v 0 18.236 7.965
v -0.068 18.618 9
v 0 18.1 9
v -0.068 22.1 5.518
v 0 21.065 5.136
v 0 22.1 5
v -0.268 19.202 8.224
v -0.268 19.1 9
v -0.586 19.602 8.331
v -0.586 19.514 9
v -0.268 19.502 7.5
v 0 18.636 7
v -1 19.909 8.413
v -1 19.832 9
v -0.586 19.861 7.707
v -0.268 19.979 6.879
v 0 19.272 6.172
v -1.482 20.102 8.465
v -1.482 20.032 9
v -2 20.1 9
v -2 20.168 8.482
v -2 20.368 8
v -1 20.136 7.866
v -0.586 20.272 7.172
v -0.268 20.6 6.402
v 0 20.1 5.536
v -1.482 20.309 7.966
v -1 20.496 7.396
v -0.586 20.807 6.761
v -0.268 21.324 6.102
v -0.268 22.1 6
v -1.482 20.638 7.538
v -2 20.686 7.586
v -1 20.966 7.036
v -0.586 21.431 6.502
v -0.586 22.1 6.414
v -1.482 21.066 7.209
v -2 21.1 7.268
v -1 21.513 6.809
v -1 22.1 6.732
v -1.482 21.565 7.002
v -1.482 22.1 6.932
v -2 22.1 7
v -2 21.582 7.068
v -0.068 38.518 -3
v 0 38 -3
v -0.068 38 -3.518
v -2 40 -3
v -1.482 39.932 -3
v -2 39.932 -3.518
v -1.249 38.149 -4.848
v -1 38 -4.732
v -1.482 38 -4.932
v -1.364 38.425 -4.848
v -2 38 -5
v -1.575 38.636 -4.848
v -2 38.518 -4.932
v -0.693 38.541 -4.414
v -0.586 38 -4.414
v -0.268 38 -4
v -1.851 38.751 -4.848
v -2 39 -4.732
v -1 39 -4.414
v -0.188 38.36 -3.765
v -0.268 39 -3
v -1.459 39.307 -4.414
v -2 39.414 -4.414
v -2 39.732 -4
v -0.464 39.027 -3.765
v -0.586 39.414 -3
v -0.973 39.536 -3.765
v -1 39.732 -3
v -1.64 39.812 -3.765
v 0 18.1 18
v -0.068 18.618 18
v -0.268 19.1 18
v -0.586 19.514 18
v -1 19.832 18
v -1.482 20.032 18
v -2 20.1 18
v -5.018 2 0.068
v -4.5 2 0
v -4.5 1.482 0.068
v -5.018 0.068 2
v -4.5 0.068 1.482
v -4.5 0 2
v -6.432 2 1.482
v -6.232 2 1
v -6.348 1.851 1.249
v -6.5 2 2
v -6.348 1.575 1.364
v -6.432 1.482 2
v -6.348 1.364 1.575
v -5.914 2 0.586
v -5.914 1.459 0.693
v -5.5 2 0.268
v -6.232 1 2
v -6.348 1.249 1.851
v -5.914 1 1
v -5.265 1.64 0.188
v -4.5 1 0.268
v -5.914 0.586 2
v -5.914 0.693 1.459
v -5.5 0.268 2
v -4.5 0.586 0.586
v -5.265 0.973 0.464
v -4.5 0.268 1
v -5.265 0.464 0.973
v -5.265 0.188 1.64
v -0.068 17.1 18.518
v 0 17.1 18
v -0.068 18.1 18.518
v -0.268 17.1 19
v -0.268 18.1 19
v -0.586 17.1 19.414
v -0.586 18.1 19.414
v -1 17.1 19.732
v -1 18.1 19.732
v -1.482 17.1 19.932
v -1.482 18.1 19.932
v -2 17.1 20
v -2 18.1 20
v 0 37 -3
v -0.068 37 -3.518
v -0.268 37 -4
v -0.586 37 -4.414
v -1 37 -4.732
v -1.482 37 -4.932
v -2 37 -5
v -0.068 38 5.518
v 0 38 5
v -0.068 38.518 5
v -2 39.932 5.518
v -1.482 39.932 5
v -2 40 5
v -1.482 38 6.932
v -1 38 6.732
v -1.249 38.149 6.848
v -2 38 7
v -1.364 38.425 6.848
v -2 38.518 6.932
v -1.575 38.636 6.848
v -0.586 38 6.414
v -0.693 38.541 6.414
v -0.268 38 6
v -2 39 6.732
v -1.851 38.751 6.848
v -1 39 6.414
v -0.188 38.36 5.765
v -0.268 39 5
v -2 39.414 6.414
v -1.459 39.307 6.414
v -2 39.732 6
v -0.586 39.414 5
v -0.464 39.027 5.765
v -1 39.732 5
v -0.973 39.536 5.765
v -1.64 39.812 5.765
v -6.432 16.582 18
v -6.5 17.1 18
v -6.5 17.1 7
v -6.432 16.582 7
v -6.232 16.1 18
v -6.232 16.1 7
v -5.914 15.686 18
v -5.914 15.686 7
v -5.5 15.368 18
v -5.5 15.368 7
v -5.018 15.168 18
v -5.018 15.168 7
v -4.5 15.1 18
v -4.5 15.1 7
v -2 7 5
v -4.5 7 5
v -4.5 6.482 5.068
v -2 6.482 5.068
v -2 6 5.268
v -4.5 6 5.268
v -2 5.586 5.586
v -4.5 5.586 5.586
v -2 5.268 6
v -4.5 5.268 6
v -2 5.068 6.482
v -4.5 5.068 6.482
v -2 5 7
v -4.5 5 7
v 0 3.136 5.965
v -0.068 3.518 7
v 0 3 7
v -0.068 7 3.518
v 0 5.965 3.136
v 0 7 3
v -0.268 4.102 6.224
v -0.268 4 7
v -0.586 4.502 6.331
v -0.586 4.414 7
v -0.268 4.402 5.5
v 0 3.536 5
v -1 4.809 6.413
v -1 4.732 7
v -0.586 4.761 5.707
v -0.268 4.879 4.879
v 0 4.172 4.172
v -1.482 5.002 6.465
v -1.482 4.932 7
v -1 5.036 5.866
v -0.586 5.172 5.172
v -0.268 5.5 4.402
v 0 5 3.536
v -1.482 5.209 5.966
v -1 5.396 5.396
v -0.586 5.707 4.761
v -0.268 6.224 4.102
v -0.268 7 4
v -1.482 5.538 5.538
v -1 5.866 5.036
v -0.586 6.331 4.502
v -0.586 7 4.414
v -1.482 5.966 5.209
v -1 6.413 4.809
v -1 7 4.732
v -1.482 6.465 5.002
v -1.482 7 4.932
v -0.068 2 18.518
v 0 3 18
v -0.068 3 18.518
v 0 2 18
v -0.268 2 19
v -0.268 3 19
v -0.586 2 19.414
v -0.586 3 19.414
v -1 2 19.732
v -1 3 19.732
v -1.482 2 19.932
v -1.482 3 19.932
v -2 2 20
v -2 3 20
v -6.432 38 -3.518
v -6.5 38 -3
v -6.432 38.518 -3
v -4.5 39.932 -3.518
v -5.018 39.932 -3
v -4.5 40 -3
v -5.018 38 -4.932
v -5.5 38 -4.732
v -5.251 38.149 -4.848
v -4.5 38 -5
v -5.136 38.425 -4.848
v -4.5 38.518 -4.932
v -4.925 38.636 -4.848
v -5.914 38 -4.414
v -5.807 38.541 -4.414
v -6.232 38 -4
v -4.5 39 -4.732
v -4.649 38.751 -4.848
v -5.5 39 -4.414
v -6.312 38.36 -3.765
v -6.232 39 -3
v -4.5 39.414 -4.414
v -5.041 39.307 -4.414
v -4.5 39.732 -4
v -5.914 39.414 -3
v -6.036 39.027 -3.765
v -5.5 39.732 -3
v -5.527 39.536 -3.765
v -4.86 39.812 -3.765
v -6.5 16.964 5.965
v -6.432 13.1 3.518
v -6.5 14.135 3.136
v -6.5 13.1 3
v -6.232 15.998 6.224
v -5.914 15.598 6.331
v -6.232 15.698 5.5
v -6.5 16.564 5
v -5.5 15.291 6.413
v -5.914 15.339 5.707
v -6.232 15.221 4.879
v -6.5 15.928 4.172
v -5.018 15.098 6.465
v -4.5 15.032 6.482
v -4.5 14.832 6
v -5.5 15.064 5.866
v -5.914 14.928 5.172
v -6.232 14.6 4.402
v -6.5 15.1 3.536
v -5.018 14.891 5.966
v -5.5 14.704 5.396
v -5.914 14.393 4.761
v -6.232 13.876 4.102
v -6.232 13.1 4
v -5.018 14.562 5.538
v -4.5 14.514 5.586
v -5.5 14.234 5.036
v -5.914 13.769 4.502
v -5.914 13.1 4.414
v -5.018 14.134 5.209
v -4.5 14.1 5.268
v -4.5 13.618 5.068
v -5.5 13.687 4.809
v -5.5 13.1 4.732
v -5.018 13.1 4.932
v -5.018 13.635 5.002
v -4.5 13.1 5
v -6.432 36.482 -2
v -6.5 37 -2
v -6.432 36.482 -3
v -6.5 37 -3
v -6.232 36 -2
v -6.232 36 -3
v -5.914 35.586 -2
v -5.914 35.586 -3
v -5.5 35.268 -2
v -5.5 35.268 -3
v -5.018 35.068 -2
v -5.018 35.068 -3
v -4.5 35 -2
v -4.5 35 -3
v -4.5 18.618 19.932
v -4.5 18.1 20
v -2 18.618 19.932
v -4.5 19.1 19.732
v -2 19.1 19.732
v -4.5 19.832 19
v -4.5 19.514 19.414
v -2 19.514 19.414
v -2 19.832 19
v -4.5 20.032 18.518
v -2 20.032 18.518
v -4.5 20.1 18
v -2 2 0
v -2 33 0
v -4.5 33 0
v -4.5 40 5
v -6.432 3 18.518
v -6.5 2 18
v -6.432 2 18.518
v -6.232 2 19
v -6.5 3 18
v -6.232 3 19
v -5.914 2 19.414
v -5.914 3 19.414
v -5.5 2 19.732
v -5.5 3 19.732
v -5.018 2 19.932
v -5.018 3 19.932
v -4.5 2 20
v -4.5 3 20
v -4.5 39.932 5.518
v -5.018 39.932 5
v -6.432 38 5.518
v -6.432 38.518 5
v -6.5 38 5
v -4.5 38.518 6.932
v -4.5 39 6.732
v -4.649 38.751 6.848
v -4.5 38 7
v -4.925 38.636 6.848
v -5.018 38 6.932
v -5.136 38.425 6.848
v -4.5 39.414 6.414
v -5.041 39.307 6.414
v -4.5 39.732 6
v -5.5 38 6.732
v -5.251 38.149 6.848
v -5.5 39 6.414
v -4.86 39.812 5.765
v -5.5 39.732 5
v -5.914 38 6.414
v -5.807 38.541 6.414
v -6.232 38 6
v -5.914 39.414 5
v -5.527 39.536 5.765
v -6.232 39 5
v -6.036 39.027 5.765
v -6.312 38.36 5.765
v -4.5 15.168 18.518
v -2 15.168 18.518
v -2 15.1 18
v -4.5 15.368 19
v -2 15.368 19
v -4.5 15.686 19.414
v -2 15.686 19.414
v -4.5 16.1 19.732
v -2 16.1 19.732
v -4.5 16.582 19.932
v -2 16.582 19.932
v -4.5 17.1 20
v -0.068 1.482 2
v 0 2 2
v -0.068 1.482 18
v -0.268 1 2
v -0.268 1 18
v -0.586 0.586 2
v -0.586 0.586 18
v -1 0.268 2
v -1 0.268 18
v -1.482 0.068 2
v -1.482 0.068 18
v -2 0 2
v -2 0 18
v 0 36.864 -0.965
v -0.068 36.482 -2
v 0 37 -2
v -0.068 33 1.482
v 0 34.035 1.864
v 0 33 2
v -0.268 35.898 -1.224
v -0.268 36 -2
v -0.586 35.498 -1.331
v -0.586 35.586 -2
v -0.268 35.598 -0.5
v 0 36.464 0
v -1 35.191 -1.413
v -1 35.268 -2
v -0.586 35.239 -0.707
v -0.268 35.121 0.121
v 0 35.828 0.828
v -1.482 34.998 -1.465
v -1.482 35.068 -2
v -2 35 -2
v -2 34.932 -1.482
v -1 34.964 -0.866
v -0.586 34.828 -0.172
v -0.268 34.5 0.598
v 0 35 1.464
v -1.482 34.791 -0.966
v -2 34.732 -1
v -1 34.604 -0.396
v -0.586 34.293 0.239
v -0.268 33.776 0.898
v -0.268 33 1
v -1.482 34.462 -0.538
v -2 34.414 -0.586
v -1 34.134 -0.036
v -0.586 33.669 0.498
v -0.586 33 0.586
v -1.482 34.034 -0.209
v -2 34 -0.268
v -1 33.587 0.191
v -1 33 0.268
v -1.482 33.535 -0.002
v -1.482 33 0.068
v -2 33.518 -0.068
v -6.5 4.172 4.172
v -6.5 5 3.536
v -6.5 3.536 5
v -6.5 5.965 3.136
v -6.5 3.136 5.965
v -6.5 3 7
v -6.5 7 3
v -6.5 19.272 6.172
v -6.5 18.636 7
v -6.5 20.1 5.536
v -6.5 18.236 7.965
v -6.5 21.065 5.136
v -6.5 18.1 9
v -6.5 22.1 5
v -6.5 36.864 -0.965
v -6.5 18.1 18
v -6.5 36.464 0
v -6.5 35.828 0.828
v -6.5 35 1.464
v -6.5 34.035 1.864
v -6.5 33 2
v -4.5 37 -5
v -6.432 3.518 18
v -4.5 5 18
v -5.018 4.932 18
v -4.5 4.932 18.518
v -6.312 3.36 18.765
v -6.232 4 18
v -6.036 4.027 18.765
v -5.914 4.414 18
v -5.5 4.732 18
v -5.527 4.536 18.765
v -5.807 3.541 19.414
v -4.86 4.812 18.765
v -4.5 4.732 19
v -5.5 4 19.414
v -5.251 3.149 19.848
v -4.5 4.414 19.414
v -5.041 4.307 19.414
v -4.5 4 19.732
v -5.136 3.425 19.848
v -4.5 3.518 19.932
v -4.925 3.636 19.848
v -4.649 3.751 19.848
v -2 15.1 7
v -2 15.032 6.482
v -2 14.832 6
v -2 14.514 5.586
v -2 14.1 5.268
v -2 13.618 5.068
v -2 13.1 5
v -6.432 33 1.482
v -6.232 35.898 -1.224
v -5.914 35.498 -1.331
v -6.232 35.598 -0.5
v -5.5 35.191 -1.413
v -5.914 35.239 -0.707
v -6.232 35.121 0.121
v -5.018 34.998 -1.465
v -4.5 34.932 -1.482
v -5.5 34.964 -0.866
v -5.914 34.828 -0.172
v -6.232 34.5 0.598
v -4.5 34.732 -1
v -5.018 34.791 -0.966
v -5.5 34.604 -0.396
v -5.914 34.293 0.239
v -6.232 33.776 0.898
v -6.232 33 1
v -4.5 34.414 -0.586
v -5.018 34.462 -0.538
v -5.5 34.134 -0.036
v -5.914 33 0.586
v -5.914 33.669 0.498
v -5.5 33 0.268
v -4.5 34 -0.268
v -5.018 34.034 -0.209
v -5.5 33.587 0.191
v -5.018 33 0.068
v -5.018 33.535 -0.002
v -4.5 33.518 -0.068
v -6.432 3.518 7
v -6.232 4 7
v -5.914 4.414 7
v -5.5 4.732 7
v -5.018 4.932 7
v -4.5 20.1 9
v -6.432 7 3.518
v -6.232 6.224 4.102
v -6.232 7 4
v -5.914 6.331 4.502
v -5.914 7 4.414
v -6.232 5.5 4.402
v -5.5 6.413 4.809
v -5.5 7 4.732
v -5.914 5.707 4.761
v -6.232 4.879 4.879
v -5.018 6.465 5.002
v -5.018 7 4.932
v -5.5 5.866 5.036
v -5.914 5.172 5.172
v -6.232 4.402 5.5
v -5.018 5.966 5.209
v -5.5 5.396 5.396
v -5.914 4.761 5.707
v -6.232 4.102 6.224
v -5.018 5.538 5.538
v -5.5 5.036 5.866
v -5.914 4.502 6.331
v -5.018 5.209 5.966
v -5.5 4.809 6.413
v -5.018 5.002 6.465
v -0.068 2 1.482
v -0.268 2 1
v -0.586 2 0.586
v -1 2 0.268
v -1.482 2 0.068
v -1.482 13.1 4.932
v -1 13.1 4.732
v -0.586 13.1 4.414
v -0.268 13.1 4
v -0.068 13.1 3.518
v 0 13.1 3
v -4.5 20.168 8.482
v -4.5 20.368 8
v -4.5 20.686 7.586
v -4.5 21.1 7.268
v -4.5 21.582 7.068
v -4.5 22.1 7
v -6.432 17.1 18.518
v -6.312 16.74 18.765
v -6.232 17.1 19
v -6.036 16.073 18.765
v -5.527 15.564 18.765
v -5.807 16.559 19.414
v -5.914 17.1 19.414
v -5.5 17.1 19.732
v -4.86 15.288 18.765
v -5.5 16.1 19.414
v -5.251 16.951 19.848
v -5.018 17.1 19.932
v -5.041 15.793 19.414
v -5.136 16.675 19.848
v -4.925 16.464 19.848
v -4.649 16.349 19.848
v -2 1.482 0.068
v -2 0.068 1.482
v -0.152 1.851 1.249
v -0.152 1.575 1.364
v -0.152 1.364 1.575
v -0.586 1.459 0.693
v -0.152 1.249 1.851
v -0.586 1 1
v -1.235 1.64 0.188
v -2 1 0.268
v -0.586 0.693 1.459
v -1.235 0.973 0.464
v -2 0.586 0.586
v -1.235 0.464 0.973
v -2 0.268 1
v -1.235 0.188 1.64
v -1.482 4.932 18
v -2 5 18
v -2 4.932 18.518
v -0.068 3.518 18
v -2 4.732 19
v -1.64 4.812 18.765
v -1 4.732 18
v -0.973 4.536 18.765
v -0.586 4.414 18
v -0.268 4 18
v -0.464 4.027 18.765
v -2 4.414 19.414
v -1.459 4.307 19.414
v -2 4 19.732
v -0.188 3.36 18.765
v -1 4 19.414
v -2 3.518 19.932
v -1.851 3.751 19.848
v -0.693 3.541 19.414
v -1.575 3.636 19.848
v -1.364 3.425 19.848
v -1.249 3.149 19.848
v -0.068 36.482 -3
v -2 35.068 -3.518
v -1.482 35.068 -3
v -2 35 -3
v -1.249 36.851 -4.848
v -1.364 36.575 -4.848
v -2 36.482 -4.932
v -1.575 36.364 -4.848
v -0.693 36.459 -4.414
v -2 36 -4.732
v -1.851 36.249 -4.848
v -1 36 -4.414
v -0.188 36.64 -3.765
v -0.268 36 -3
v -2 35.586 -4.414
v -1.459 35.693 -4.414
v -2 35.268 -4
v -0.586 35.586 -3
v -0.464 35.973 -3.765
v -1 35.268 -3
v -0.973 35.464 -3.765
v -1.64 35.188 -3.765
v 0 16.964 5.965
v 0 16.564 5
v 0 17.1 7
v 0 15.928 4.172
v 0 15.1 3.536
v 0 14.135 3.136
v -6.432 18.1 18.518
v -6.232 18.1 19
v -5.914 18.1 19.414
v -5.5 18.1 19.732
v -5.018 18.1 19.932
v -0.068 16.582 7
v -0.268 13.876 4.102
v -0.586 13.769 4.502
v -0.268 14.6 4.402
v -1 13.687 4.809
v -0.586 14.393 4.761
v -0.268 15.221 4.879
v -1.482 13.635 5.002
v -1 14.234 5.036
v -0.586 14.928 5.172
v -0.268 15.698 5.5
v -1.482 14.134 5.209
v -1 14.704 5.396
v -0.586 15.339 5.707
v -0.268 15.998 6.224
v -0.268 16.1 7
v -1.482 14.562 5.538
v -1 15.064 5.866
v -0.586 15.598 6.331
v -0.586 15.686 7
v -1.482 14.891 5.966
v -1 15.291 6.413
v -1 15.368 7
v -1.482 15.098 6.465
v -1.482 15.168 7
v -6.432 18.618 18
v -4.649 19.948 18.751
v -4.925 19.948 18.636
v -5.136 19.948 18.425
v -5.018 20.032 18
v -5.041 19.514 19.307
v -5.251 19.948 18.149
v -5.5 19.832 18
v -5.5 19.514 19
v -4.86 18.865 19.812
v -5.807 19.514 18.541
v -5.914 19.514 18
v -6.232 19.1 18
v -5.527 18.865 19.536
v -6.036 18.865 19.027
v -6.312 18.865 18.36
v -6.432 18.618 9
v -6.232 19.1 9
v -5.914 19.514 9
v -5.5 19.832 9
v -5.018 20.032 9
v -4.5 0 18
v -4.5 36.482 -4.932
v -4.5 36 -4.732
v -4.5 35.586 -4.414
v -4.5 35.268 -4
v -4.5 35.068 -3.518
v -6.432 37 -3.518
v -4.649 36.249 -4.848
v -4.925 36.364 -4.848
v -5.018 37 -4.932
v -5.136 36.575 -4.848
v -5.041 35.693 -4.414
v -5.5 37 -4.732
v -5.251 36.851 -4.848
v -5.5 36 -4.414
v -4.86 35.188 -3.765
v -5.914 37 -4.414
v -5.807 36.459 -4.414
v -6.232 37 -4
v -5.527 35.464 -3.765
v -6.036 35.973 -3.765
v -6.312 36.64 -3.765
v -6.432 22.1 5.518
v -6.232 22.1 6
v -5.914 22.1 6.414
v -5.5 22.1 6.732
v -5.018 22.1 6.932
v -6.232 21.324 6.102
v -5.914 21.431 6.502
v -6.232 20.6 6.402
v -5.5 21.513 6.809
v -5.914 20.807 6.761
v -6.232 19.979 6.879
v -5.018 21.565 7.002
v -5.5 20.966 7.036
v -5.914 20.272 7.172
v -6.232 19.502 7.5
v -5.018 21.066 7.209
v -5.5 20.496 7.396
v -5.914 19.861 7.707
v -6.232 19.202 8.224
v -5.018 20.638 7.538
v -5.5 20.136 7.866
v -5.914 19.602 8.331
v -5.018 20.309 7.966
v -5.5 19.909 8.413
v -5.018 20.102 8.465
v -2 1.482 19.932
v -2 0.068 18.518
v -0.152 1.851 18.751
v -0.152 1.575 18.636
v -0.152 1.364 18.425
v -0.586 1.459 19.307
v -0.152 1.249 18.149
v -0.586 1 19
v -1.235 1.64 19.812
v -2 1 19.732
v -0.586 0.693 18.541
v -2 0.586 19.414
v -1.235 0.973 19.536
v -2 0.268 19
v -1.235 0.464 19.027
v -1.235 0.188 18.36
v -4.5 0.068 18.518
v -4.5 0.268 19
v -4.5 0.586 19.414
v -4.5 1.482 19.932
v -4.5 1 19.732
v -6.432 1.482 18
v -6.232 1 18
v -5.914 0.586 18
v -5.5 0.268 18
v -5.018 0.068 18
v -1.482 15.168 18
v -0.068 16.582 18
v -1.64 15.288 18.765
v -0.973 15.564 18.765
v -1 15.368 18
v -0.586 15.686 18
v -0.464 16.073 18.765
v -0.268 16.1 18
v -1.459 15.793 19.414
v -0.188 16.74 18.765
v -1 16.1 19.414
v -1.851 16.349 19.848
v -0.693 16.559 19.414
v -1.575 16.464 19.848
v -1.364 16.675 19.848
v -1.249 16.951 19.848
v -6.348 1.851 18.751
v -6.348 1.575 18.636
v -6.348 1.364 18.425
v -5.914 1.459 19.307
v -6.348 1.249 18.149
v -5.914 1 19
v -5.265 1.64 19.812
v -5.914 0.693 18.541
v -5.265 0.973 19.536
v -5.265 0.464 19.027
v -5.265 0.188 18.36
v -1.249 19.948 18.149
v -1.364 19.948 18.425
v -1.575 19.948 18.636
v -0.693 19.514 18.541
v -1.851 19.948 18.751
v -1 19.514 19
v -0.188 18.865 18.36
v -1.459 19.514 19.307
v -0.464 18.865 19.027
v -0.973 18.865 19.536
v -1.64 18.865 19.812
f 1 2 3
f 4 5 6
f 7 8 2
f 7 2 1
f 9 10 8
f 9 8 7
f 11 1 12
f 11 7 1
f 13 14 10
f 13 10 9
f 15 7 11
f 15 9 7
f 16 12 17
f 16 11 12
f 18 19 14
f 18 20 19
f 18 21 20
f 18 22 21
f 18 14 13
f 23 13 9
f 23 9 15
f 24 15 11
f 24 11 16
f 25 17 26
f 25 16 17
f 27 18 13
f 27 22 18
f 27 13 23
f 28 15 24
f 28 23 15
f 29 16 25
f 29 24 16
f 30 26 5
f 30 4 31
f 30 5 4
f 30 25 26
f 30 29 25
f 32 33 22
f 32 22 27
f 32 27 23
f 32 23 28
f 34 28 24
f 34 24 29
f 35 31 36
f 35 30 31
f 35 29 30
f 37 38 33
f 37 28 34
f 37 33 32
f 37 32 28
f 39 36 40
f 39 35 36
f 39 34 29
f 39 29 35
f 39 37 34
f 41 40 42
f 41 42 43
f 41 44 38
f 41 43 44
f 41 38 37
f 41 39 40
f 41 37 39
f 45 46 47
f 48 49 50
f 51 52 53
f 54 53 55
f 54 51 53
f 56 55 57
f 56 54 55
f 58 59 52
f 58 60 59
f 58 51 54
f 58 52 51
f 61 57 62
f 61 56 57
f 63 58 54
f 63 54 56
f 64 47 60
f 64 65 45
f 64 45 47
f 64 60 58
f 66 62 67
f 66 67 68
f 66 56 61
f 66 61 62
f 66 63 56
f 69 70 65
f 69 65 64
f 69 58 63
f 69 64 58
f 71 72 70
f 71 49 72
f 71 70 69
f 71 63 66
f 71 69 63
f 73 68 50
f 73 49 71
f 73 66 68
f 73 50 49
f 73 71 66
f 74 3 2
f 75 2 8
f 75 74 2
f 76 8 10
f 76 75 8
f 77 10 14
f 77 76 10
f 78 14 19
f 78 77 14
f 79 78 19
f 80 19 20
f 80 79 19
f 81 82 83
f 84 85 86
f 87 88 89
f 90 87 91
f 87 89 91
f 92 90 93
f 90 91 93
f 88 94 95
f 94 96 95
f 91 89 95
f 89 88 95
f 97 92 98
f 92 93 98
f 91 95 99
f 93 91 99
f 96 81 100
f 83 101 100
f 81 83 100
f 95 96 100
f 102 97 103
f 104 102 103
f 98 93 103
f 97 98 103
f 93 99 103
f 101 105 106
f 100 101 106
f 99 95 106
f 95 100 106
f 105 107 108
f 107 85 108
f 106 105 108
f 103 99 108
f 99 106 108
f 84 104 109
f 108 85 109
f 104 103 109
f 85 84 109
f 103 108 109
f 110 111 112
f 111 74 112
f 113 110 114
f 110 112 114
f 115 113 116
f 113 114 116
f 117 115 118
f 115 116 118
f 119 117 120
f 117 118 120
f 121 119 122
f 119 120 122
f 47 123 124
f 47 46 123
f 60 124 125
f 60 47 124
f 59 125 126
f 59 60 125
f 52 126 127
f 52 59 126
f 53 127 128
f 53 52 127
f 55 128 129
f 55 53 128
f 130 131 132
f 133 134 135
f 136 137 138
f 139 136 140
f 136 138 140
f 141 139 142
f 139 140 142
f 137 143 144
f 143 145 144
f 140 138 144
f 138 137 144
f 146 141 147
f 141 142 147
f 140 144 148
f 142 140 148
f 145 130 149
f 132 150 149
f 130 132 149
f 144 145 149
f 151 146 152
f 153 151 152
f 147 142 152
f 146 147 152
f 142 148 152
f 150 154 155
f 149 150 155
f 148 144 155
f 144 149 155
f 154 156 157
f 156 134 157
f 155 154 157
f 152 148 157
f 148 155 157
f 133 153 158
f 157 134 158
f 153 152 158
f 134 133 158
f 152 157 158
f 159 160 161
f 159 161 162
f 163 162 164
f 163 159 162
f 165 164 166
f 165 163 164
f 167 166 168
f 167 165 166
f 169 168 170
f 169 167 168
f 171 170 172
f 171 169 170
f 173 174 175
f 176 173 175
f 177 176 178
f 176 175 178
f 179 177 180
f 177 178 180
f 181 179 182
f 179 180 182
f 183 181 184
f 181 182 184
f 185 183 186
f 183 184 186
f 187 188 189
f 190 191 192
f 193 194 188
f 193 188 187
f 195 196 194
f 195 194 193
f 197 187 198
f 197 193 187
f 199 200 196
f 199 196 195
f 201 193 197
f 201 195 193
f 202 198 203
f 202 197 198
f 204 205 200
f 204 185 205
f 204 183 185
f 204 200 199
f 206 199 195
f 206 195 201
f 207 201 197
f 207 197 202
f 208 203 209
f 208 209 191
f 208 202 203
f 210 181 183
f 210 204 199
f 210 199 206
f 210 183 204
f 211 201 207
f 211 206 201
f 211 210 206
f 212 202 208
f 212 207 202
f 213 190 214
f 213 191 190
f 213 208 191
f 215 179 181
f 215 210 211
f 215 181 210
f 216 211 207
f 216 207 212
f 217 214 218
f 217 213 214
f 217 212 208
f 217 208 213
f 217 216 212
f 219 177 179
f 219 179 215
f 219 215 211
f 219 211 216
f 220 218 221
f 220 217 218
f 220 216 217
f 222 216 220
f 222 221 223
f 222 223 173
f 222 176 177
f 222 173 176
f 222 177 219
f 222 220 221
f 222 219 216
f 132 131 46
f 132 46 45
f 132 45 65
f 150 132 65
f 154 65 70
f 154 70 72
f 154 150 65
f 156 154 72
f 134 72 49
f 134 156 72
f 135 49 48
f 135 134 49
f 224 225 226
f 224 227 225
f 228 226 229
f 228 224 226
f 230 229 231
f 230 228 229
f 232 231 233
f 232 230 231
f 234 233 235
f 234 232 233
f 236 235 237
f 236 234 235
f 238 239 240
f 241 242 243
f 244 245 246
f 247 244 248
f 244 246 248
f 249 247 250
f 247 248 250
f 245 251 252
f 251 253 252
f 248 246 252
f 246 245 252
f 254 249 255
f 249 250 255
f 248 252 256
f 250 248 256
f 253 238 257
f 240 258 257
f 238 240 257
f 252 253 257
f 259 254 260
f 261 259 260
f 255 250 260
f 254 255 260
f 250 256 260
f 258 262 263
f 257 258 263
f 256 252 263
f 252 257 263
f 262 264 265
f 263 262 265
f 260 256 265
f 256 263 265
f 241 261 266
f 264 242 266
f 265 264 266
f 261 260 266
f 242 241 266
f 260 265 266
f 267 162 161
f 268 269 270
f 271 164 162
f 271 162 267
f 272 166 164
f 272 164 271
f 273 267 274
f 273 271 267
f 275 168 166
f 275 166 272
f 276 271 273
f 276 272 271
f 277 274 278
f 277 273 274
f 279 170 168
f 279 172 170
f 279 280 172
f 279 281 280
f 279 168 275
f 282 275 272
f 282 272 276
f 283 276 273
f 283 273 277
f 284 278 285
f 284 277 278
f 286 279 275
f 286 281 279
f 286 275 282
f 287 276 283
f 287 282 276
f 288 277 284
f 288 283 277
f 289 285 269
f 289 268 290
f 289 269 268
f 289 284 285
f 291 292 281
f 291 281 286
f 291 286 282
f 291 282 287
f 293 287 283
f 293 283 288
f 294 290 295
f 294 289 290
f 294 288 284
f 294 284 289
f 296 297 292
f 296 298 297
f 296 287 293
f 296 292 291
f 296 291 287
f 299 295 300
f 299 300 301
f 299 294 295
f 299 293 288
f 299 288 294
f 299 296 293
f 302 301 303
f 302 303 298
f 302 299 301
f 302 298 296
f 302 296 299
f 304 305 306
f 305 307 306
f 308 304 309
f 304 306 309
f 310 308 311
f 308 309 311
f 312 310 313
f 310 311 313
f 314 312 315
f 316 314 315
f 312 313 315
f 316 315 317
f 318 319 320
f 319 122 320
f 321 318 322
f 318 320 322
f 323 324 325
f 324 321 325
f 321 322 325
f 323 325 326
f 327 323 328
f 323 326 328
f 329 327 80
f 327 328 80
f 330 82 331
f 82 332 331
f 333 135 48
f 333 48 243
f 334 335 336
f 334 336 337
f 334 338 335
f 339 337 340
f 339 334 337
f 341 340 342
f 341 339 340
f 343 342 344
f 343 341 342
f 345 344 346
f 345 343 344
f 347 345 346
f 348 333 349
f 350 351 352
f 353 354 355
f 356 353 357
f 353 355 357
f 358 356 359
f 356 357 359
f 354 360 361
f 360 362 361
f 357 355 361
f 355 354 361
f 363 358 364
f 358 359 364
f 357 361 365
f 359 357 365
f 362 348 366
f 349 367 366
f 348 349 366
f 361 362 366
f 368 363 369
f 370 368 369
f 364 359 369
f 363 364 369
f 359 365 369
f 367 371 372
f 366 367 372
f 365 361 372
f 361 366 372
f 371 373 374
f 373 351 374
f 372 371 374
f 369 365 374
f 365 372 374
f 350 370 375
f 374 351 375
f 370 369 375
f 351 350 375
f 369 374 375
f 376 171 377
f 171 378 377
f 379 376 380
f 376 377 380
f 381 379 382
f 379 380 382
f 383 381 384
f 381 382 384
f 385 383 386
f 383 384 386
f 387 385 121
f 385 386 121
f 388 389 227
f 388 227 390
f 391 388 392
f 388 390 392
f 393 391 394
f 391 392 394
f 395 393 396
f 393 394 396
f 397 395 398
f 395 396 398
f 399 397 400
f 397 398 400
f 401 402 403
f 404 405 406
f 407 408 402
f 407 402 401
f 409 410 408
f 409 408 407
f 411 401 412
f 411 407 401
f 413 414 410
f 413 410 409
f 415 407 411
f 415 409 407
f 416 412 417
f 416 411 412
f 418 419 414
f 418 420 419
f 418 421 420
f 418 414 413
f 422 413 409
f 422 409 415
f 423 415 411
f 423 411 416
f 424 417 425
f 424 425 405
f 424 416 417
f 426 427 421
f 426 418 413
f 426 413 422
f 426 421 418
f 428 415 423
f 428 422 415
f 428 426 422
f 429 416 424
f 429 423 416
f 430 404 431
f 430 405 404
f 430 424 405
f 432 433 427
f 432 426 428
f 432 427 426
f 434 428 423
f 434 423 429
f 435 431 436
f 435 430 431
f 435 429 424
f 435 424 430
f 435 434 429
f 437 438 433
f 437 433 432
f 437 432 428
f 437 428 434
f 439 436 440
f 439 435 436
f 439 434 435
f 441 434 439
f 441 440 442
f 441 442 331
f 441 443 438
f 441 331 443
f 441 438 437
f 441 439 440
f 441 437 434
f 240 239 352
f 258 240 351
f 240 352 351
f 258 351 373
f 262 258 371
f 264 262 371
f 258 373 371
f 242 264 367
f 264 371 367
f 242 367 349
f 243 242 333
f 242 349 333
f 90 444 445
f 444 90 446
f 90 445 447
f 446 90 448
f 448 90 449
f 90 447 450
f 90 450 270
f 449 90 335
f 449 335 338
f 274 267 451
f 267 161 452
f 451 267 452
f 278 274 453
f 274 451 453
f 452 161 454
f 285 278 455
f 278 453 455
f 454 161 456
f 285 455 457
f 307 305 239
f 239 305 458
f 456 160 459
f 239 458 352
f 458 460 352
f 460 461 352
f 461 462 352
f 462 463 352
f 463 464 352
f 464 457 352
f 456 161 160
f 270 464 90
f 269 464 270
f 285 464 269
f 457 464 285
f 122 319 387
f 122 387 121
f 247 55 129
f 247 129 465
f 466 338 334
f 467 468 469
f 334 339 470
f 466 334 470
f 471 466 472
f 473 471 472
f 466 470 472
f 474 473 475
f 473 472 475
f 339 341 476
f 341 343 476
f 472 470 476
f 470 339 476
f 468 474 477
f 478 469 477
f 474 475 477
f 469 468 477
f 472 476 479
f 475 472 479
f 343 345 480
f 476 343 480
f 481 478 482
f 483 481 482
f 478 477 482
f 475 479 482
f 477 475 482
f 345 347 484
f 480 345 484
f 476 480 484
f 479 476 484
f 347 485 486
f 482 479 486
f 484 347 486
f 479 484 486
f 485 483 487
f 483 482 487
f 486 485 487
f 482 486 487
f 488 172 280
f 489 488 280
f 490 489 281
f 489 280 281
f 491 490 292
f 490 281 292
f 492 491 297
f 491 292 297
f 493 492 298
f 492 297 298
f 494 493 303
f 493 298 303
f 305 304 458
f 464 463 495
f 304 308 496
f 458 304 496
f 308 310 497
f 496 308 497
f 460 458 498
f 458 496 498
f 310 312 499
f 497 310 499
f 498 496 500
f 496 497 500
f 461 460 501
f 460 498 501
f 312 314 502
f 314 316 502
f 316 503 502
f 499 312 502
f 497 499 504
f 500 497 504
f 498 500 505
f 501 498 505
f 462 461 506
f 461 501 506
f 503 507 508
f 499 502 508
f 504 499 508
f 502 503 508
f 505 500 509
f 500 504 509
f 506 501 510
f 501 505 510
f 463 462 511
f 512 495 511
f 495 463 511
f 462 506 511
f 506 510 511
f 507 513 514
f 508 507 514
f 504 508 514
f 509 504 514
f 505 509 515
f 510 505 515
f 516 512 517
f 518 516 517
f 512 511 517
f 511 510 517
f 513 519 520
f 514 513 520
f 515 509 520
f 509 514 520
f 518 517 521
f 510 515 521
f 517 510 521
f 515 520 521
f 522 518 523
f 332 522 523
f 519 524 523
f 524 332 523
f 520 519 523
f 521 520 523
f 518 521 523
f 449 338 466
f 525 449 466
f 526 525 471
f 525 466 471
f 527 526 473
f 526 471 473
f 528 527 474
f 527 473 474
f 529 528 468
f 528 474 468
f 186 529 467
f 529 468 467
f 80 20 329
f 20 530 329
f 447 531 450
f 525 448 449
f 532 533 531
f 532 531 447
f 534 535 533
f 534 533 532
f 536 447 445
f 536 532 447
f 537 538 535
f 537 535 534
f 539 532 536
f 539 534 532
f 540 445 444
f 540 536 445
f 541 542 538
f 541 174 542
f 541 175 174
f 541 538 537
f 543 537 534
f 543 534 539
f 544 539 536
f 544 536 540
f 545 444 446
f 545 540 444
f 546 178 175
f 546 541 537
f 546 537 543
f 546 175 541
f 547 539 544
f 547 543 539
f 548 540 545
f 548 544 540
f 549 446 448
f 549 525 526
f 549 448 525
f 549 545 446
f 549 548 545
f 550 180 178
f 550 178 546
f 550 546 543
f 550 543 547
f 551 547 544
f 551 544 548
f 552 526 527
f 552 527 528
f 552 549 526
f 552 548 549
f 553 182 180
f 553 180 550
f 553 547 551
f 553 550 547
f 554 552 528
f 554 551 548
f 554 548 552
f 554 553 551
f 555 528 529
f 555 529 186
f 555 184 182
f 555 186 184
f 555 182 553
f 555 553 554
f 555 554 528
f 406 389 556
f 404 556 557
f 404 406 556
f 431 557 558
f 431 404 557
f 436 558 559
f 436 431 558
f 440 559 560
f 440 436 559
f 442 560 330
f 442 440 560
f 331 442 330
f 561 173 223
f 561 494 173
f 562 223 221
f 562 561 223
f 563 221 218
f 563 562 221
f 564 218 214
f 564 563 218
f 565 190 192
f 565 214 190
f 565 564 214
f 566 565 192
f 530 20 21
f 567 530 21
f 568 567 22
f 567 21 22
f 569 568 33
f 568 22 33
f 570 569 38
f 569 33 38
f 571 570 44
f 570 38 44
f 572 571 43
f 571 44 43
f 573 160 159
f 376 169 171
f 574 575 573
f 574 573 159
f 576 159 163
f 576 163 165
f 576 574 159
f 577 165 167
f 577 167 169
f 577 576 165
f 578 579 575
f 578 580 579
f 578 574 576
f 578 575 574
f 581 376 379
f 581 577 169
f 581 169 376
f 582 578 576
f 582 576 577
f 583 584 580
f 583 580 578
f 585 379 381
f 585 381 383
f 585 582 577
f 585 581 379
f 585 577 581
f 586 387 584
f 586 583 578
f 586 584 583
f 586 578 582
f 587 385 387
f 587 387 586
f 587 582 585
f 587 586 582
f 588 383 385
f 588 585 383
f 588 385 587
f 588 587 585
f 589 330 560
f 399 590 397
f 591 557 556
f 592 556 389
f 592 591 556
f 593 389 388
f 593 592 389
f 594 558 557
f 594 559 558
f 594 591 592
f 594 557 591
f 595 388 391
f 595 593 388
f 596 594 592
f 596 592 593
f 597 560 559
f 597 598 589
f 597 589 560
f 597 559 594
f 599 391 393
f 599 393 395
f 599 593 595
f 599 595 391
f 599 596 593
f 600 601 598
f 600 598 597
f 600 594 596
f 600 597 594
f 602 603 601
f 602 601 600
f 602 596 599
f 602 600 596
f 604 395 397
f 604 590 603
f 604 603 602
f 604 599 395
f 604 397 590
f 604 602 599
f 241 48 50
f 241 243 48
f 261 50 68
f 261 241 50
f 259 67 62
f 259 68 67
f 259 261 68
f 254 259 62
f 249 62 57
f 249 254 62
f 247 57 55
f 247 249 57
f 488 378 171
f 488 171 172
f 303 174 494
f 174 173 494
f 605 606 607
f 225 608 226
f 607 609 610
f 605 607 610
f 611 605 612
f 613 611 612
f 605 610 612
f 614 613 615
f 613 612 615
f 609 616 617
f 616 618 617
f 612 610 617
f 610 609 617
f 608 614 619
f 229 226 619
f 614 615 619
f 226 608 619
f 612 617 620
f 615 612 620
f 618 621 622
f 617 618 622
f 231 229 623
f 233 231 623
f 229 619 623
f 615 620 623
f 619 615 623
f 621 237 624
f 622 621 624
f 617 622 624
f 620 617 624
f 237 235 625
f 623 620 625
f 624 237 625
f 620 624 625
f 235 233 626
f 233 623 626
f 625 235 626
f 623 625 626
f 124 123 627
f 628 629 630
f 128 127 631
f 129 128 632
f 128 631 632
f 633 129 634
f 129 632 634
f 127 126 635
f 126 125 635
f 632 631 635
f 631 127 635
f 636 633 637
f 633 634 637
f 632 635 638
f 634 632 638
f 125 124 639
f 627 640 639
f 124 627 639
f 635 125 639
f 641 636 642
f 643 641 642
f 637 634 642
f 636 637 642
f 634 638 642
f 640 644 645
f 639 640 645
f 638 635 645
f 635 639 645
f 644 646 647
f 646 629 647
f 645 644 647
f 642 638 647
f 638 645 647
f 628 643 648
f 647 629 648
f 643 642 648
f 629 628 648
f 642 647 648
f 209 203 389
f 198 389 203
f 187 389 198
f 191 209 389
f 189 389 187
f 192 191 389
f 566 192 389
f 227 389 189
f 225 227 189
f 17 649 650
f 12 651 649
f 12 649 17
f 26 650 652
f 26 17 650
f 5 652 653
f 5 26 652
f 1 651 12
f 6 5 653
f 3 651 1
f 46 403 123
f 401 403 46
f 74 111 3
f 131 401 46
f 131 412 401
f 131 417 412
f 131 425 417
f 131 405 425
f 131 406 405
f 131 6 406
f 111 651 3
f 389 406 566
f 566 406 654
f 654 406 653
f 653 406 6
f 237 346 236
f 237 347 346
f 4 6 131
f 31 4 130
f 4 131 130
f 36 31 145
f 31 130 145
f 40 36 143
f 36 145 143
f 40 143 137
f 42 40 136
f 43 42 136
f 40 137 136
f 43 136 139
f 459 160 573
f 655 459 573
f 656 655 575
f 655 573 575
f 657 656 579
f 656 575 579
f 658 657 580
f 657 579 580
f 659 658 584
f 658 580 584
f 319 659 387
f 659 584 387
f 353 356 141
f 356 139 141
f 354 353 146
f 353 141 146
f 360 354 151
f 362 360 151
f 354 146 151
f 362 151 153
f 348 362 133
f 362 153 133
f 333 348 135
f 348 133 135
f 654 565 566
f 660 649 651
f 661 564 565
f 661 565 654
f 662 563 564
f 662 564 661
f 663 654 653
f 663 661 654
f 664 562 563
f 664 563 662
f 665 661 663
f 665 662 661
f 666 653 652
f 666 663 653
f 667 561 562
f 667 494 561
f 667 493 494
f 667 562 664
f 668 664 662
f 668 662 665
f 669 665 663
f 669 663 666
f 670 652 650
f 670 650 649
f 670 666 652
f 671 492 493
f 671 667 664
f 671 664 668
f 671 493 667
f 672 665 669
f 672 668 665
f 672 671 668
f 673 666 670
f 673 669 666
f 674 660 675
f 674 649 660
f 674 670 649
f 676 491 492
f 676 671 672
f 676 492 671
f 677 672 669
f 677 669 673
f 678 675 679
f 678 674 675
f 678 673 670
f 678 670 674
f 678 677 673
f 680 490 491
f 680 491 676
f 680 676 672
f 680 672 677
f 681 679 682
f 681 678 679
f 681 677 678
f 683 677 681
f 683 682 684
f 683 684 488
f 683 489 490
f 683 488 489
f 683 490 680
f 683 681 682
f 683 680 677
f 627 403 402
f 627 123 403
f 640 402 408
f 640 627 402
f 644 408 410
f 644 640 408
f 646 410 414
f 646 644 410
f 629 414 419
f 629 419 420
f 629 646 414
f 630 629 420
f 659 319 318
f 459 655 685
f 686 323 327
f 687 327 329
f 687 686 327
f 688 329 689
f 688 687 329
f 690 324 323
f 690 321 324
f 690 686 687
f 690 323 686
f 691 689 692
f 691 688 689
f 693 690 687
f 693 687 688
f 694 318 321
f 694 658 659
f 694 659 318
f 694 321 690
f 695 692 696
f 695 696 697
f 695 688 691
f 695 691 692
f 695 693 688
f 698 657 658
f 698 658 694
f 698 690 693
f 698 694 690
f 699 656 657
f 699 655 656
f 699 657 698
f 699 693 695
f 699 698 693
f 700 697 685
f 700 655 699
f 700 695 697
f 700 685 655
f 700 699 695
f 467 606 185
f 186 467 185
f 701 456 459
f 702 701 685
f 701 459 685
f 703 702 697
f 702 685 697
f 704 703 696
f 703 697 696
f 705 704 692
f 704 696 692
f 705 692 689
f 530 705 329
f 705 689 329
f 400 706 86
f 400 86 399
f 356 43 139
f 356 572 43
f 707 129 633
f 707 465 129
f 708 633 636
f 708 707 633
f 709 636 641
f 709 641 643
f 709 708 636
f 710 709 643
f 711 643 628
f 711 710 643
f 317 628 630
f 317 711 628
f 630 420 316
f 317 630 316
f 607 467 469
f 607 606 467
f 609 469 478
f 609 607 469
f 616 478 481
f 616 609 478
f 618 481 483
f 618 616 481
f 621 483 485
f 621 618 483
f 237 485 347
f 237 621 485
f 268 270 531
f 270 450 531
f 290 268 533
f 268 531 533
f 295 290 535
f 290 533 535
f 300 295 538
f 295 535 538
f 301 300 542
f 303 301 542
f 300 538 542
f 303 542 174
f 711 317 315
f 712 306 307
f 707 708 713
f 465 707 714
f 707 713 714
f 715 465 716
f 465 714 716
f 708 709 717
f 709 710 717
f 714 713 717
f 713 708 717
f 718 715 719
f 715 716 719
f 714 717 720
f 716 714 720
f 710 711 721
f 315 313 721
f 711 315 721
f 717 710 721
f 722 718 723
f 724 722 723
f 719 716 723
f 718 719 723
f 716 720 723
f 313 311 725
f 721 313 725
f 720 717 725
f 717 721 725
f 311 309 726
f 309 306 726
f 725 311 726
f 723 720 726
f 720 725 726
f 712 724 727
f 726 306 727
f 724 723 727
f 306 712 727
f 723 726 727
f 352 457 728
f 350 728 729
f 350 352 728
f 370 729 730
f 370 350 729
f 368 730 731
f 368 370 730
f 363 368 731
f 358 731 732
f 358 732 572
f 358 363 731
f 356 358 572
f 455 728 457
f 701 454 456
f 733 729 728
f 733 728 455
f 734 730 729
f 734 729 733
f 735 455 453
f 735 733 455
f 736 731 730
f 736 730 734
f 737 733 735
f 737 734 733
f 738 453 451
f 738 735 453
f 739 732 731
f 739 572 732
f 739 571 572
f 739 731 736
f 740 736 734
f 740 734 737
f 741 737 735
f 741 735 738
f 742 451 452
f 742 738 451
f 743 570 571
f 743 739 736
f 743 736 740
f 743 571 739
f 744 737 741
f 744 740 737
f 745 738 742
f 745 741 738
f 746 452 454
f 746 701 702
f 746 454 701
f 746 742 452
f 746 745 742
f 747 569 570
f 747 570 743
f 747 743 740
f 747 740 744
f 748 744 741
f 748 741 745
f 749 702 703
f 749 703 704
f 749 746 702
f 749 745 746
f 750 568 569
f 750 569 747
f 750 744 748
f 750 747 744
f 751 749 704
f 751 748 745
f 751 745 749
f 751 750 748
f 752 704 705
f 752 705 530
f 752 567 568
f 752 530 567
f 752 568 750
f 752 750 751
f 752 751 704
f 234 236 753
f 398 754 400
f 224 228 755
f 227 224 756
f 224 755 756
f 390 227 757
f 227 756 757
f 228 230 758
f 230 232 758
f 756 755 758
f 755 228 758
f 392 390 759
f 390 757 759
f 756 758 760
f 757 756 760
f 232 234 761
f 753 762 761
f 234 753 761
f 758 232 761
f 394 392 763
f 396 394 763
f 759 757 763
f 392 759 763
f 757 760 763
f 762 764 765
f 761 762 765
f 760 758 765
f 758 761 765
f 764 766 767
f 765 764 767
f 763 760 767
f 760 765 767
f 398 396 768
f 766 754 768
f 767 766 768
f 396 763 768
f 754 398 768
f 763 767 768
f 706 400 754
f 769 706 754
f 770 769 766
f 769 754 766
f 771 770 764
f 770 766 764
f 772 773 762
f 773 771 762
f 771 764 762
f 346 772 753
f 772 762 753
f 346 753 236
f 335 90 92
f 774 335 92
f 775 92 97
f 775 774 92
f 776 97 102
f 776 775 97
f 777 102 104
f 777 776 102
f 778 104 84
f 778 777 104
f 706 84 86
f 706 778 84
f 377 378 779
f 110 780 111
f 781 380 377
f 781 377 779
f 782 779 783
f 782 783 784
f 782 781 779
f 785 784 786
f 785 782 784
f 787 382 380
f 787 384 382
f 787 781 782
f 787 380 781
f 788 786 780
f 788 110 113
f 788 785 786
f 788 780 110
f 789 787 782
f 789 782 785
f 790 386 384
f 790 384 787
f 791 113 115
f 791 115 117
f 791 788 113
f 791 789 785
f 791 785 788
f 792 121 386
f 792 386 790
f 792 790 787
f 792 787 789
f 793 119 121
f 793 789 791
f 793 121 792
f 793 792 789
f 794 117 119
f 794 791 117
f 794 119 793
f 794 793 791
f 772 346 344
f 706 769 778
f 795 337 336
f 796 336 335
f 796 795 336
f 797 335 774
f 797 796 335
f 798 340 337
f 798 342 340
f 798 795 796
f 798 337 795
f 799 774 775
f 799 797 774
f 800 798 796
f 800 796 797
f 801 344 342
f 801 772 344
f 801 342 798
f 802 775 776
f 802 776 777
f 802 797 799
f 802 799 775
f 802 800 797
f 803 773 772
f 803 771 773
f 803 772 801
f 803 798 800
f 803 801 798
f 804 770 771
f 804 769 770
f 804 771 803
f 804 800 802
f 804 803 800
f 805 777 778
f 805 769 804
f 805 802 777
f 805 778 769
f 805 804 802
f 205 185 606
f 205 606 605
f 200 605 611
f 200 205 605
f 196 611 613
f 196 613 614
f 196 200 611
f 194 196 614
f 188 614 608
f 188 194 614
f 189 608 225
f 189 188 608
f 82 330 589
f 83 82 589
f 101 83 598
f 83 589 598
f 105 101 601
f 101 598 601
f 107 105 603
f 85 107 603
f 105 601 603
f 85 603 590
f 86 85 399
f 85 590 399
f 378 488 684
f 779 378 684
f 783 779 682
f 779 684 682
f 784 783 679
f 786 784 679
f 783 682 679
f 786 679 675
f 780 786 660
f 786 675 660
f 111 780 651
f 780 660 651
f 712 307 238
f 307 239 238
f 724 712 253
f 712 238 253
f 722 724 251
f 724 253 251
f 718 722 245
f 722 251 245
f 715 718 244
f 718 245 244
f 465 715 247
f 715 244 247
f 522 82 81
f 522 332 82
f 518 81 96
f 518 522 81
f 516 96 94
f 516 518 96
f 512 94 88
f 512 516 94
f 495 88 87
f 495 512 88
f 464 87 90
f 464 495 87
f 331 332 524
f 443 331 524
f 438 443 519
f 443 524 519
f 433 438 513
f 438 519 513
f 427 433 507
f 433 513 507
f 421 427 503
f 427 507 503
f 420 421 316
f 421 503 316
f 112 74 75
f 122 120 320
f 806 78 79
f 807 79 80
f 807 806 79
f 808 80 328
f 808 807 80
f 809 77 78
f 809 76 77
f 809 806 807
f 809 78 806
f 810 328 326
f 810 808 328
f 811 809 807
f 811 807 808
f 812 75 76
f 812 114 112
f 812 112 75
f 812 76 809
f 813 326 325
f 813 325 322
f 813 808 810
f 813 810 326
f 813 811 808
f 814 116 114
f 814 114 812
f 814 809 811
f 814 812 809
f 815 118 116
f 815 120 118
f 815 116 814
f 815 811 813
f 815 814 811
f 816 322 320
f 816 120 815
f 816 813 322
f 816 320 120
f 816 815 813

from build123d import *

# Parameters (mm, degrees)
SKETCH1_W           = 6.5
SKETCH1_H           = 40
BOSS_EXTRUDE1_DEPTH = 20
SKETCH2_W           = 15
SKETCH2_H           = 10.1
CUT_EXTRUDE1_DEPTH  = 46.191260217
FILLET1_R           = 2
SKETCH4_W           = 13
SKETCH4_H           = 19.9
CUT_EXTRUDE3_DEPTH  = 46.191260217
SKETCH6_W           = 6.5
SKETCH6_H           = 5
BOSS_EXTRUDE2_DEPTH = 5
FILLET2_R           = 2


with BuildPart() as part:
    # Sketch1 → Boss-Extrude1 (new body)
    with BuildSketch(Plane.XY):
        with Locations((-3.25, 20)):
            Rectangle(SKETCH1_W, SKETCH1_H)
    extrude(amount=BOSS_EXTRUDE1_DEPTH)

    # Sketch2 → Cut-Extrude1 (cut, through all)
    with BuildSketch(Plane(origin=(0, 0, 0), x_dir=(0, 0, -1), z_dir=(1, 0, 0))):
        with Locations((-12.5, 10.05)):
            Rectangle(SKETCH2_W, SKETCH2_H)
    extrude(amount=-CUT_EXTRUDE1_DEPTH, mode=Mode.SUBTRACT)

    # Fillet1
    fillet1_edges = [part.edges().sort_by_distance(p)[0] for p in [
        (-6.5, 15.1, 12.5),
        (-6.5, 10.05, 5),
        (-3.25, 15.1, 5),
        (-6.5, 5, 12.5),
        (-3.25, 5, 5),
        (0, 5, 12.5),
        (0, 10.05, 5),
        (0, 15.1, 12.5),
    ]]
    fillet(fillet1_edges, radius=FILLET1_R)

    # Sketch4 → Cut-Extrude3 (cut, through all)
    with BuildSketch(Plane.ZY.offset(6.5)):
        with Locations((13.5, 30.05)):
            Rectangle(SKETCH4_W, SKETCH4_H)
    extrude(amount=-CUT_EXTRUDE3_DEPTH, mode=Mode.SUBTRACT)

    # Sketch6 → Boss-Extrude2 (add)
    with BuildSketch(Plane(origin=(0, 0, 0), x_dir=(-1, 0, 0), z_dir=(0, 0, -1))):
        with Locations((3.25, 37.5)):
            Rectangle(SKETCH6_W, SKETCH6_H)
    extrude(amount=BOSS_EXTRUDE2_DEPTH)

    # Fillet2
    fillet2_edges = [part.edges().sort_by_distance(p)[0] for p in [
        (-3.25, 0, 20),
        (-6.5, 1.5, 20),
        (-3.25, 5, 20),
        (-0.585786438, 4.414213562, 20),
        (-5.914213562, 4.414213562, 20),
        (0, 18.6, 20),
        (-3.25, 15.1, 20),
        (-0.585786438, 15.685786438, 20),
        (-5.914213562, 15.685786438, 20),
        (0, 1.5, 20),
        (-3.25, 0, 0),
        (0, 17.5, 0),
        (-6.5, 18.6, 20),
        (-6.5, 40, 1),
        (0, 40, 1),
        (0, 20.1, 13.5),
        (-3.25, 20.1, 20),
        (0, 30.05, 7),
        (-3.25, 20.1, 7),
        (-3.25, 40, 7),
        (-6.5, 30.05, 7),
        (-6.5, 20.1, 13.5),
        (-6.5, 17.5, 0),
        (0, 0, 10),
        (-3.25, 35, 0),
        (-6.5, 0, 10),
        (0, 35, -2.5),
        (-6.5, 35, -2.5),
        (0, 37.5, -5),
        (-3.25, 35, -5),
        (-6.5, 37.5, -5),
        (-3.25, 40, -5),
    ]]
    fillet(fillet2_edges, radius=FILLET2_R)


solid = part.part
